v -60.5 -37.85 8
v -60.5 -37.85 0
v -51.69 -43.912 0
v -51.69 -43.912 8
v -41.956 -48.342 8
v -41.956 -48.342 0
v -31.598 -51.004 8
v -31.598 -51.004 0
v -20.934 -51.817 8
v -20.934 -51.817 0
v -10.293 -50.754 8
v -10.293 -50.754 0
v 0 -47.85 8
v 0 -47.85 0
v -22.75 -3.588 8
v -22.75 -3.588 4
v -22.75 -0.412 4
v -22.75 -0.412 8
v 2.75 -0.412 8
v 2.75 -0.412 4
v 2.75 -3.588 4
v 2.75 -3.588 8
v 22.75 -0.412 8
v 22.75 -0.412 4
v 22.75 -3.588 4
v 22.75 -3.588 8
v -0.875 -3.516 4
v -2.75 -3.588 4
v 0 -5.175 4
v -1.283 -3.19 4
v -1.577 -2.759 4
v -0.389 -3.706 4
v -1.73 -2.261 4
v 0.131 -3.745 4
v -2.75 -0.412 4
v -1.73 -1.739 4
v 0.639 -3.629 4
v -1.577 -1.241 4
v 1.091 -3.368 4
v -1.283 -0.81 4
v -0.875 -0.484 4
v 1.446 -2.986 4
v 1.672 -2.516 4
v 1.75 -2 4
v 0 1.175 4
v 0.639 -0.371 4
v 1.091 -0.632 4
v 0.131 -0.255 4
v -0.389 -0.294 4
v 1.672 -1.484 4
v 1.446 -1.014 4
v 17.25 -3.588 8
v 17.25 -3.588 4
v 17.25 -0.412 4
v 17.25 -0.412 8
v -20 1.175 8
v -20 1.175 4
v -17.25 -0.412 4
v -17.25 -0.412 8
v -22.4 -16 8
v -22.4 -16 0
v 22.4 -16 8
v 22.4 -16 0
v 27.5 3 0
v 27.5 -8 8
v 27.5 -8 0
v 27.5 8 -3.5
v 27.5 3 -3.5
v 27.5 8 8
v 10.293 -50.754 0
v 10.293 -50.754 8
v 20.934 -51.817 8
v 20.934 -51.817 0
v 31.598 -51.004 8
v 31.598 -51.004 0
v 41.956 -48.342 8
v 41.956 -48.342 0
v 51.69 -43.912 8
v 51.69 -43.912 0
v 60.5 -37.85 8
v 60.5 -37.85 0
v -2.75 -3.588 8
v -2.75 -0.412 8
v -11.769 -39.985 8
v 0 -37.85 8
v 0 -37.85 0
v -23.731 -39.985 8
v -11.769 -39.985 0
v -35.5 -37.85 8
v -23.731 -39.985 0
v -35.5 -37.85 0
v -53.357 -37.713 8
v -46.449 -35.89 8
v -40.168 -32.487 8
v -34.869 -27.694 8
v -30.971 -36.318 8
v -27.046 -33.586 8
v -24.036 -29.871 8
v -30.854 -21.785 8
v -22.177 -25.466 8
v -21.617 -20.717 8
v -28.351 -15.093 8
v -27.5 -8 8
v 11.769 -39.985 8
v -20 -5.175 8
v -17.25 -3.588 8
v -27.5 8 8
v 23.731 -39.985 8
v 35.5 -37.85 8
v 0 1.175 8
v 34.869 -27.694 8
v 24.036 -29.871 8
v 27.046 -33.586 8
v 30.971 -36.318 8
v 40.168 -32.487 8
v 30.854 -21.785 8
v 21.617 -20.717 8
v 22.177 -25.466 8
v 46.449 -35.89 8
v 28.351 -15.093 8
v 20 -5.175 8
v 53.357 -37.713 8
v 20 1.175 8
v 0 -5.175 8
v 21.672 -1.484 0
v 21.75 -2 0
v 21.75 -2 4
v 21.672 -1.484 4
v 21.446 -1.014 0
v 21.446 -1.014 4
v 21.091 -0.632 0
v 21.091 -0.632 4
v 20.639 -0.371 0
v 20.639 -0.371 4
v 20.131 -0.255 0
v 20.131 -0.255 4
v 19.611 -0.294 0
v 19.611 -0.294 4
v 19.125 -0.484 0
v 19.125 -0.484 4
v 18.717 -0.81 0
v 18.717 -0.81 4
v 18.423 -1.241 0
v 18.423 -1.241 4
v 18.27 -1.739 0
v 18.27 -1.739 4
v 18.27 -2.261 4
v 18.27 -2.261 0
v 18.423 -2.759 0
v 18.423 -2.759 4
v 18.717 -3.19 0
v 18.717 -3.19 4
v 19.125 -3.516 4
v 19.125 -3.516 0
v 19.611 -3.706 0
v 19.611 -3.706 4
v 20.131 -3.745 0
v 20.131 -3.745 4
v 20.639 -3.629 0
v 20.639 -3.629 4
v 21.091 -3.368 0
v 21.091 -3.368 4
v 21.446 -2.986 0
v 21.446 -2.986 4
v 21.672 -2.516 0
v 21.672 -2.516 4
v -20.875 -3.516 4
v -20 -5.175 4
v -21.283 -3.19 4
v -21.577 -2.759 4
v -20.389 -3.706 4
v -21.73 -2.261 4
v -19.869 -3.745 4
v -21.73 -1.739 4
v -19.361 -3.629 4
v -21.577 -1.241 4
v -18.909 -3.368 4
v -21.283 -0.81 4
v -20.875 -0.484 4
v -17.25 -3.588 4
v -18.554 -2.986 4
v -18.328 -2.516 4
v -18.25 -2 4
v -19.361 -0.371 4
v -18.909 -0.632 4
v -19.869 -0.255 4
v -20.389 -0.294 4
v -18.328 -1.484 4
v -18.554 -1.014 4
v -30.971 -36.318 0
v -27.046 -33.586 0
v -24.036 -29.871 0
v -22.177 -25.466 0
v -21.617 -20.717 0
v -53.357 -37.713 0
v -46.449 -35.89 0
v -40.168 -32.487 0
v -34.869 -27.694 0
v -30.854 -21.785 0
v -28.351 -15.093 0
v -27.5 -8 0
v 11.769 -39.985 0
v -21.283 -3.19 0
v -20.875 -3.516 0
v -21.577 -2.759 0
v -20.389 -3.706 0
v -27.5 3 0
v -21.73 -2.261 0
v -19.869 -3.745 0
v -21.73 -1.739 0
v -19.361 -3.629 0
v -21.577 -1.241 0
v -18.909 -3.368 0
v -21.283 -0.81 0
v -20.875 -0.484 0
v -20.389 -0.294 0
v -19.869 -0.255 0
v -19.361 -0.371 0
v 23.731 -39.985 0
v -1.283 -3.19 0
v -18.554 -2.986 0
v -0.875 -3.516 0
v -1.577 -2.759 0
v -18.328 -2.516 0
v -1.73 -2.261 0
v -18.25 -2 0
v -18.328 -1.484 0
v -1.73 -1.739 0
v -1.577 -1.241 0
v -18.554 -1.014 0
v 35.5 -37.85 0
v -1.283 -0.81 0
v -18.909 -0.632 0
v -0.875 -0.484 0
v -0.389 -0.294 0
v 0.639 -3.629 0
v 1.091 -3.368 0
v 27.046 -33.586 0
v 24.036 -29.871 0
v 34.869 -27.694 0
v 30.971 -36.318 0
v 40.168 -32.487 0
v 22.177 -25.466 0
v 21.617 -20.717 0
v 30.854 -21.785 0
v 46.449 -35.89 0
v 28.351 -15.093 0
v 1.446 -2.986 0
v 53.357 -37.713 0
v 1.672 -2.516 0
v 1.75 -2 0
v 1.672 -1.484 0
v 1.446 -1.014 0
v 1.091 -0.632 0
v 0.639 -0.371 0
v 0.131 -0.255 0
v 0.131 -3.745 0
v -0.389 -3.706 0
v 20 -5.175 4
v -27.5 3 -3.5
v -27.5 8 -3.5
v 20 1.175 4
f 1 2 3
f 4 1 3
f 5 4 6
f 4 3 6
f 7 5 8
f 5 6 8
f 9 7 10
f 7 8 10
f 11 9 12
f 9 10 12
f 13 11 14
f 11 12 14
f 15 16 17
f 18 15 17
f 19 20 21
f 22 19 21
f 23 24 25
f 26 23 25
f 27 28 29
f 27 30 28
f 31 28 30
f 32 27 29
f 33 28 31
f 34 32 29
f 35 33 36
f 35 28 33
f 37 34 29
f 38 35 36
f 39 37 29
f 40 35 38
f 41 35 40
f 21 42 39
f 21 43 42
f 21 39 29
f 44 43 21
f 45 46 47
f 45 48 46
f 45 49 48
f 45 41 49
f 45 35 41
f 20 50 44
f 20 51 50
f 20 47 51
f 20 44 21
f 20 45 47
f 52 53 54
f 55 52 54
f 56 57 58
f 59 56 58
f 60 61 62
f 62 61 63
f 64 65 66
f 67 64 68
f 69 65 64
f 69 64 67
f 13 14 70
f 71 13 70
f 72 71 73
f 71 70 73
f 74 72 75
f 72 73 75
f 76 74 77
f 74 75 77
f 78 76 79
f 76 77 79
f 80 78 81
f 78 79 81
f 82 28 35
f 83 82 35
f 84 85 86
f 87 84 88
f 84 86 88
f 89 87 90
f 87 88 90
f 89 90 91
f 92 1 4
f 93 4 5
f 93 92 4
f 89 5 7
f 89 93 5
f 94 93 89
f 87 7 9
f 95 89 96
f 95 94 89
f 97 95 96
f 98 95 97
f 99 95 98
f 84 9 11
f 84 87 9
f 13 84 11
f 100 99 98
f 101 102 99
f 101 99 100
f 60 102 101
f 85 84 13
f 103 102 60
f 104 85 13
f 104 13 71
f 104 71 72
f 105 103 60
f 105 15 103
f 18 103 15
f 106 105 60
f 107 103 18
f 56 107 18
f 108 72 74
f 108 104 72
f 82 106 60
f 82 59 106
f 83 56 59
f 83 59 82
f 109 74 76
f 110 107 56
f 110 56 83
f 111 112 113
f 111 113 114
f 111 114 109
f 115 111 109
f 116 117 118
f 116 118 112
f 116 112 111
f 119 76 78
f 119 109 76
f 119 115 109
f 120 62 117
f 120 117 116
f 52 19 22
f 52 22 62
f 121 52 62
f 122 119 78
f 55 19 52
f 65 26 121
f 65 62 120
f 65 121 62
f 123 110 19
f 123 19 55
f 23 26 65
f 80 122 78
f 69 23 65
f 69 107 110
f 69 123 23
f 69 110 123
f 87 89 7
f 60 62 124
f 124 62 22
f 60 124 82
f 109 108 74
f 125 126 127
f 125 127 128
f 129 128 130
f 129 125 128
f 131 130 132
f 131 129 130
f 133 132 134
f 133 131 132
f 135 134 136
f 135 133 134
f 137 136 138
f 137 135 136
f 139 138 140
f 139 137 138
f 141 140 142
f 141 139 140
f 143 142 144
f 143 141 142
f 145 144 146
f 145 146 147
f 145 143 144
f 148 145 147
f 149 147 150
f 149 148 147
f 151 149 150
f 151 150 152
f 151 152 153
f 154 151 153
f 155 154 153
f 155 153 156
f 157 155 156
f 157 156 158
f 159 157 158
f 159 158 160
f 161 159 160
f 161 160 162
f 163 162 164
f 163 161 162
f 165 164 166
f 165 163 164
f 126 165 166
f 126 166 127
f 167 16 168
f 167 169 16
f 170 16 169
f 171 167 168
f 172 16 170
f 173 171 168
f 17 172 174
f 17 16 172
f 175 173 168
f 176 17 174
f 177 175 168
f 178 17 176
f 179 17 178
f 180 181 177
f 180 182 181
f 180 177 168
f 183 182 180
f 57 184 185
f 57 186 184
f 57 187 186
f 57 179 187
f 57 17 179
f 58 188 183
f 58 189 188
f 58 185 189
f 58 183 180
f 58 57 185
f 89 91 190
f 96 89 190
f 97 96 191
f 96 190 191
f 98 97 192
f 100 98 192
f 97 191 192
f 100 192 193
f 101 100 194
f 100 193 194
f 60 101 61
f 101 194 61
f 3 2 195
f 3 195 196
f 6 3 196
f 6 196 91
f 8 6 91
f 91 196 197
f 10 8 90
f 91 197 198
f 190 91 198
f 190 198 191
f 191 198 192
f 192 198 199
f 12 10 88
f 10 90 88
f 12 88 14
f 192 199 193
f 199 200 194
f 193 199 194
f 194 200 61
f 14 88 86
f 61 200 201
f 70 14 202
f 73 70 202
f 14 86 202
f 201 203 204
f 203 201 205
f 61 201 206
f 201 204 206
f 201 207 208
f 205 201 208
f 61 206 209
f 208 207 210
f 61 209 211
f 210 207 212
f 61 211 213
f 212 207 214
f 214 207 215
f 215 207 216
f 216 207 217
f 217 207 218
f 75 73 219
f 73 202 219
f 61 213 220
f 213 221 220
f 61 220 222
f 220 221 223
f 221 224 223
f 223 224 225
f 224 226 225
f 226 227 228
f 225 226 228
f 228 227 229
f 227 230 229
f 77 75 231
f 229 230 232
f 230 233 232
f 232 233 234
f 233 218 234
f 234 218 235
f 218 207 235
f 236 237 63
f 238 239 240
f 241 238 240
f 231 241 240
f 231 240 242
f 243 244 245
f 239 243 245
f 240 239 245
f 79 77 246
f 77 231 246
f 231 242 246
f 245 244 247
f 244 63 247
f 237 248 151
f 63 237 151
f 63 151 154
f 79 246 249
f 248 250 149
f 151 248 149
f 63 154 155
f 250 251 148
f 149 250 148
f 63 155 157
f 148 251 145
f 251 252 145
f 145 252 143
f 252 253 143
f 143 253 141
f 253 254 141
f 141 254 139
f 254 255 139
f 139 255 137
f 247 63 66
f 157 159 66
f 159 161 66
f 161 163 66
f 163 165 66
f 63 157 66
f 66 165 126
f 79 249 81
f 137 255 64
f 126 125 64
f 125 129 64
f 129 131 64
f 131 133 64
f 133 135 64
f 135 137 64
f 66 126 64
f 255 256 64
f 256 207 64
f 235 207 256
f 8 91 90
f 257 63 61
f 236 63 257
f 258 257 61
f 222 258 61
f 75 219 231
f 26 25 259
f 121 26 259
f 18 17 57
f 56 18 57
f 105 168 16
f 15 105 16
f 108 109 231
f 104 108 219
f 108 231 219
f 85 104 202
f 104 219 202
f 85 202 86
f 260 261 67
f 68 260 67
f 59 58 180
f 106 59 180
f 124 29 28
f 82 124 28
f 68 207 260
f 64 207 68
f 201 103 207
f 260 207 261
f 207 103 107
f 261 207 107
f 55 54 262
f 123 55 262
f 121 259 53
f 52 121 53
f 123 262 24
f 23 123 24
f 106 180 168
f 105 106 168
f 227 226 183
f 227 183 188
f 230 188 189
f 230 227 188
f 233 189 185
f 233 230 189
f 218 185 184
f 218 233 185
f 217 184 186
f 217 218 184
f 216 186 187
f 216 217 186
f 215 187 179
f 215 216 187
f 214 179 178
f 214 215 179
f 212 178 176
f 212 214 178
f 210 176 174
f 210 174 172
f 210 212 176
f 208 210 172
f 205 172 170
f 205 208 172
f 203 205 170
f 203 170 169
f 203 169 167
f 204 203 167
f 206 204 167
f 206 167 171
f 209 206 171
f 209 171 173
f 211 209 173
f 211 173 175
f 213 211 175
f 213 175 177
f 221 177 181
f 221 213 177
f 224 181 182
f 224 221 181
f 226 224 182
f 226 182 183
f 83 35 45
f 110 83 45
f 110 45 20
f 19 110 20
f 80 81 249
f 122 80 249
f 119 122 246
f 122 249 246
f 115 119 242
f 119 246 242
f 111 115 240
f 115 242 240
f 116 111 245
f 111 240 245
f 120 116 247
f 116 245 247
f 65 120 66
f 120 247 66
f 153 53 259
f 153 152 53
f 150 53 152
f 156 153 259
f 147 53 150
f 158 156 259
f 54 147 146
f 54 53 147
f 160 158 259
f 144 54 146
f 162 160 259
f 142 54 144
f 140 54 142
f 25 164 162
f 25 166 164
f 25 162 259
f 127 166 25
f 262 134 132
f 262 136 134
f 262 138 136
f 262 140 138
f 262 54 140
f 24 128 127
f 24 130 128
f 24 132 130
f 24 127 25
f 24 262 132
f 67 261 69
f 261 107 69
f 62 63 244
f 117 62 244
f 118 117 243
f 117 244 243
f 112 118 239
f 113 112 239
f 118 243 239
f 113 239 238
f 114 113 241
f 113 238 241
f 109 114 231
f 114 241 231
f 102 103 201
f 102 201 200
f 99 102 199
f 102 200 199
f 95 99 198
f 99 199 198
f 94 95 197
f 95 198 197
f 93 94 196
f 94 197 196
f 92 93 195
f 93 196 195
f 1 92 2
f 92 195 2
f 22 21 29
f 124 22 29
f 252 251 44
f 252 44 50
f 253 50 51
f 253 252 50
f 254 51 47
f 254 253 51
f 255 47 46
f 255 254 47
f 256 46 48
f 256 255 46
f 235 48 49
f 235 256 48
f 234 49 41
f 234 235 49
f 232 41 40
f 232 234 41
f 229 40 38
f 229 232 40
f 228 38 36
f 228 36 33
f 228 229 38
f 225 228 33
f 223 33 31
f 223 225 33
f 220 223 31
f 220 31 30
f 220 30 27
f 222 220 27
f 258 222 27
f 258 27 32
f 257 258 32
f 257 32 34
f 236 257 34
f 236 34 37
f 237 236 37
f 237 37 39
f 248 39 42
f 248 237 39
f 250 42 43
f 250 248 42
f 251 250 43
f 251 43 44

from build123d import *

# Parameters (mm, degrees)
F0_W     = 55
F0_H     = 5
F0_H_2   = 11
F1_DEPTH = 8
F0_R     = 1.75
F2_DEPTH = 4
F3_DEPTH = 3.5


with BuildPart() as f1:
    # F0 (on Top) → F1 (new body)
    with BuildSketch(Plane.XY):
        with Locations((0, 5.5)):
            Rectangle(F0_W, F0_H)
        with Locations((0, -2.5)):
            Rectangle(F0_W, F0_H_2)
        Polygon((-20, 1.175426), (-17.25, -0.412287), (-17.25, -3.587713), (-20, -5.175426), (-22.75, -3.587713), (-22.75, -0.412287), align=None, mode=Mode.SUBTRACT)
        Polygon((0, -5.175426), (-2.75, -3.587713), (-2.75, -0.412287), (0, 1.175426), (2.75, -0.412287), (2.75, -3.587713), align=None, mode=Mode.SUBTRACT)
        Polygon((17.25, -3.587713), (17.25, -0.412287), (20, 1.175426), (22.75, -0.412287), (22.75, -3.587713), (20, -5.175426), align=None, mode=Mode.SUBTRACT)
        with BuildLine():
            Line((27.5, -8), (-27.5, -8))
            ThreePointArc((-27.5, -8), (-37.375388, -30.248595), (-60.5, -37.849623))
            ThreePointArc((-60.5, -37.849623), (-31.597894, -51.004383), (0, -47.849623))
            ThreePointArc((0, -47.849623), (31.597894, -51.004383), (60.5, -37.849623))
            ThreePointArc((60.5, -37.849623), (37.375388, -30.248595), (27.5, -8))
        make_face()
        with BuildLine():
            ThreePointArc((-35.5, -37.849623), (-24.035615, -29.871255), (-22.400142, -16))
            Line((-22.400142, -16), (22.400142, -16))
            ThreePointArc((22.400142, -16), (24.035615, -29.871255), (35.5, -37.849623))
            ThreePointArc((35.5, -37.849623), (17.75, -40.253807), (0, -37.849623))
            ThreePointArc((0, -37.849623), (-17.75, -40.253807), (-35.5, -37.849623))
        make_face(mode=Mode.SUBTRACT)
    extrude(amount=F1_DEPTH)

    # F0 (on Top) → F2 (join)
    with BuildSketch(Plane.XY):
        Polygon((-17.25, -3.587713), (-17.25, -0.412287), (-20, 1.175426), (-22.75, -0.412287), (-22.75, -3.587713), (-20, -5.175426), align=None)
        with Locations((-20, -2)):
            Circle(F0_R, mode=Mode.SUBTRACT)
        Polygon((-2.75, -0.412287), (-2.75, -3.587713), (0, -5.175426), (2.75, -3.587713), (2.75, -0.412287), (0, 1.175426), align=None)
        with Locations((0, -2)):
            Circle(F0_R, mode=Mode.SUBTRACT)
        Polygon((20, 1.175426), (17.25, -0.412287), (17.25, -3.587713), (20, -5.175426), (22.75, -3.587713), (22.75, -0.412287), align=None)
        with Locations((20, -2)):
            Circle(F0_R, mode=Mode.SUBTRACT)
    extrude(amount=F2_DEPTH)

    # F0 (on Top) → F3 (join)
    with BuildSketch(Plane.XY):
        with Locations((0, 5.5)):
            Rectangle(F0_W, F0_H)
    extrude(amount=-F3_DEPTH)


solid = f1.part
